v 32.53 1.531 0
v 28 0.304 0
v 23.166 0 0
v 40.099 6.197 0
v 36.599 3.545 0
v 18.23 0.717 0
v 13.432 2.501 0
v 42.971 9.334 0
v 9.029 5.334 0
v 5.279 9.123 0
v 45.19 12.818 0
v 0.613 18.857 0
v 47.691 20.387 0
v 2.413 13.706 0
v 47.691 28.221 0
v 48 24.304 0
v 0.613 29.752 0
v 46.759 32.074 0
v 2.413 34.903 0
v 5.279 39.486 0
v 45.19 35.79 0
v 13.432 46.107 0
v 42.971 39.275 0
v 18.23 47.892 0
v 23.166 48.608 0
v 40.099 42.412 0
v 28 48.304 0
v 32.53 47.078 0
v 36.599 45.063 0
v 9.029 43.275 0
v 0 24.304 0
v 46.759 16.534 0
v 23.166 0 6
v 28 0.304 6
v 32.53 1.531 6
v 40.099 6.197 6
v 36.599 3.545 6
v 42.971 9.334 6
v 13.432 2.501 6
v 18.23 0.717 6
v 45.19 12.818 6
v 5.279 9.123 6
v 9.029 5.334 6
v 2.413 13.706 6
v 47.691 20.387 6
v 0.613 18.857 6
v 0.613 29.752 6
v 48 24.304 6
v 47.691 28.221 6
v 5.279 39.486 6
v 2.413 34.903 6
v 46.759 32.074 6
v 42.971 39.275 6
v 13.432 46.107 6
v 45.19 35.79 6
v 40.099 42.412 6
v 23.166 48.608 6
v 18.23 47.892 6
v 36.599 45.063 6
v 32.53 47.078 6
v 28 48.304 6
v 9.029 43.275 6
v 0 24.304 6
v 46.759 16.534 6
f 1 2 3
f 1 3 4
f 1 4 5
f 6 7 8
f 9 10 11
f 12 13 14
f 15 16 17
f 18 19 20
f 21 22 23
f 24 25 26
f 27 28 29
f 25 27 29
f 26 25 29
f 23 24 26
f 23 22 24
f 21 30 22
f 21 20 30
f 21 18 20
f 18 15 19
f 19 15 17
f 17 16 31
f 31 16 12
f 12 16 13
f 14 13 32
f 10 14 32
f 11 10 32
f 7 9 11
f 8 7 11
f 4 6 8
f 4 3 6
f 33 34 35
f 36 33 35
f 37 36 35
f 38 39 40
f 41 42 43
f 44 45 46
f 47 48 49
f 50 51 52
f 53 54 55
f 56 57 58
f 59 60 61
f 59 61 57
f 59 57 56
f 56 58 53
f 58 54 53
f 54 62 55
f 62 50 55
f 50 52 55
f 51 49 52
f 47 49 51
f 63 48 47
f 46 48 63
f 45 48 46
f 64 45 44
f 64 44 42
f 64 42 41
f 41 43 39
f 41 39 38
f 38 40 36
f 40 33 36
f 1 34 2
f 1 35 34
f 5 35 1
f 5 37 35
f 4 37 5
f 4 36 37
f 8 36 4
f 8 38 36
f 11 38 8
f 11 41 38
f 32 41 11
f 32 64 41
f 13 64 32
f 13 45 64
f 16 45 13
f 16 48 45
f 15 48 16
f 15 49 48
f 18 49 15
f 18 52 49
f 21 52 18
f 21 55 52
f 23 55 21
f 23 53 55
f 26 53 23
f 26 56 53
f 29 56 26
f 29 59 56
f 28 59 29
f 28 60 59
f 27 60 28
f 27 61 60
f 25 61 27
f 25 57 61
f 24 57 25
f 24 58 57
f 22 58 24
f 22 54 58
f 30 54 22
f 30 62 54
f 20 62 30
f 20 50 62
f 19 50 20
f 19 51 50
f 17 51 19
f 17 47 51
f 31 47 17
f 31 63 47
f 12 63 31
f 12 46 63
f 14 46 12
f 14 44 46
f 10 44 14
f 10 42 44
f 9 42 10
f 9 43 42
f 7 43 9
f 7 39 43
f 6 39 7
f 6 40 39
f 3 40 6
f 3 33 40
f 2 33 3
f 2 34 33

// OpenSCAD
$fn = 32;

// ----------------------------------------------------------------------
// Cam disc: base radius 20.0 mm, lift 8.0 mm, 32 profile points
// ----------------------------------------------------------------------

// --- parameters (mm) ---
profile_height = 6;       // extrusion height
profile_points = 32;      // points of the closed outline

profile = [[48, 24.304], [47.691, 28.221], [46.759, 32.074], [45.19, 35.79], [42.971, 39.275], [40.099, 42.412], [36.599, 45.063], [32.53, 47.078], [28, 48.304], [23.166, 48.608], [18.23, 47.892], [13.432, 46.107], [9.029, 43.275], [5.279, 39.486], [2.413, 34.903], [0.613, 29.752], [0, 24.304], [0.613, 18.857], [2.413, 13.706], [5.279, 9.123], [9.029, 5.334], [13.432, 2.501], [18.23, 0.717], [23.166, 0], [28, 0.304], [32.53, 1.531], [36.599, 3.545], [40.099, 6.197], [42.971, 9.334], [45.19, 12.818], [46.759, 16.534], [47.691, 20.387]];  // single closed polygon, 32 points, counter clockwise

// --- the one profile operation ---
linear_extrude(height = profile_height) polygon(points = profile);
